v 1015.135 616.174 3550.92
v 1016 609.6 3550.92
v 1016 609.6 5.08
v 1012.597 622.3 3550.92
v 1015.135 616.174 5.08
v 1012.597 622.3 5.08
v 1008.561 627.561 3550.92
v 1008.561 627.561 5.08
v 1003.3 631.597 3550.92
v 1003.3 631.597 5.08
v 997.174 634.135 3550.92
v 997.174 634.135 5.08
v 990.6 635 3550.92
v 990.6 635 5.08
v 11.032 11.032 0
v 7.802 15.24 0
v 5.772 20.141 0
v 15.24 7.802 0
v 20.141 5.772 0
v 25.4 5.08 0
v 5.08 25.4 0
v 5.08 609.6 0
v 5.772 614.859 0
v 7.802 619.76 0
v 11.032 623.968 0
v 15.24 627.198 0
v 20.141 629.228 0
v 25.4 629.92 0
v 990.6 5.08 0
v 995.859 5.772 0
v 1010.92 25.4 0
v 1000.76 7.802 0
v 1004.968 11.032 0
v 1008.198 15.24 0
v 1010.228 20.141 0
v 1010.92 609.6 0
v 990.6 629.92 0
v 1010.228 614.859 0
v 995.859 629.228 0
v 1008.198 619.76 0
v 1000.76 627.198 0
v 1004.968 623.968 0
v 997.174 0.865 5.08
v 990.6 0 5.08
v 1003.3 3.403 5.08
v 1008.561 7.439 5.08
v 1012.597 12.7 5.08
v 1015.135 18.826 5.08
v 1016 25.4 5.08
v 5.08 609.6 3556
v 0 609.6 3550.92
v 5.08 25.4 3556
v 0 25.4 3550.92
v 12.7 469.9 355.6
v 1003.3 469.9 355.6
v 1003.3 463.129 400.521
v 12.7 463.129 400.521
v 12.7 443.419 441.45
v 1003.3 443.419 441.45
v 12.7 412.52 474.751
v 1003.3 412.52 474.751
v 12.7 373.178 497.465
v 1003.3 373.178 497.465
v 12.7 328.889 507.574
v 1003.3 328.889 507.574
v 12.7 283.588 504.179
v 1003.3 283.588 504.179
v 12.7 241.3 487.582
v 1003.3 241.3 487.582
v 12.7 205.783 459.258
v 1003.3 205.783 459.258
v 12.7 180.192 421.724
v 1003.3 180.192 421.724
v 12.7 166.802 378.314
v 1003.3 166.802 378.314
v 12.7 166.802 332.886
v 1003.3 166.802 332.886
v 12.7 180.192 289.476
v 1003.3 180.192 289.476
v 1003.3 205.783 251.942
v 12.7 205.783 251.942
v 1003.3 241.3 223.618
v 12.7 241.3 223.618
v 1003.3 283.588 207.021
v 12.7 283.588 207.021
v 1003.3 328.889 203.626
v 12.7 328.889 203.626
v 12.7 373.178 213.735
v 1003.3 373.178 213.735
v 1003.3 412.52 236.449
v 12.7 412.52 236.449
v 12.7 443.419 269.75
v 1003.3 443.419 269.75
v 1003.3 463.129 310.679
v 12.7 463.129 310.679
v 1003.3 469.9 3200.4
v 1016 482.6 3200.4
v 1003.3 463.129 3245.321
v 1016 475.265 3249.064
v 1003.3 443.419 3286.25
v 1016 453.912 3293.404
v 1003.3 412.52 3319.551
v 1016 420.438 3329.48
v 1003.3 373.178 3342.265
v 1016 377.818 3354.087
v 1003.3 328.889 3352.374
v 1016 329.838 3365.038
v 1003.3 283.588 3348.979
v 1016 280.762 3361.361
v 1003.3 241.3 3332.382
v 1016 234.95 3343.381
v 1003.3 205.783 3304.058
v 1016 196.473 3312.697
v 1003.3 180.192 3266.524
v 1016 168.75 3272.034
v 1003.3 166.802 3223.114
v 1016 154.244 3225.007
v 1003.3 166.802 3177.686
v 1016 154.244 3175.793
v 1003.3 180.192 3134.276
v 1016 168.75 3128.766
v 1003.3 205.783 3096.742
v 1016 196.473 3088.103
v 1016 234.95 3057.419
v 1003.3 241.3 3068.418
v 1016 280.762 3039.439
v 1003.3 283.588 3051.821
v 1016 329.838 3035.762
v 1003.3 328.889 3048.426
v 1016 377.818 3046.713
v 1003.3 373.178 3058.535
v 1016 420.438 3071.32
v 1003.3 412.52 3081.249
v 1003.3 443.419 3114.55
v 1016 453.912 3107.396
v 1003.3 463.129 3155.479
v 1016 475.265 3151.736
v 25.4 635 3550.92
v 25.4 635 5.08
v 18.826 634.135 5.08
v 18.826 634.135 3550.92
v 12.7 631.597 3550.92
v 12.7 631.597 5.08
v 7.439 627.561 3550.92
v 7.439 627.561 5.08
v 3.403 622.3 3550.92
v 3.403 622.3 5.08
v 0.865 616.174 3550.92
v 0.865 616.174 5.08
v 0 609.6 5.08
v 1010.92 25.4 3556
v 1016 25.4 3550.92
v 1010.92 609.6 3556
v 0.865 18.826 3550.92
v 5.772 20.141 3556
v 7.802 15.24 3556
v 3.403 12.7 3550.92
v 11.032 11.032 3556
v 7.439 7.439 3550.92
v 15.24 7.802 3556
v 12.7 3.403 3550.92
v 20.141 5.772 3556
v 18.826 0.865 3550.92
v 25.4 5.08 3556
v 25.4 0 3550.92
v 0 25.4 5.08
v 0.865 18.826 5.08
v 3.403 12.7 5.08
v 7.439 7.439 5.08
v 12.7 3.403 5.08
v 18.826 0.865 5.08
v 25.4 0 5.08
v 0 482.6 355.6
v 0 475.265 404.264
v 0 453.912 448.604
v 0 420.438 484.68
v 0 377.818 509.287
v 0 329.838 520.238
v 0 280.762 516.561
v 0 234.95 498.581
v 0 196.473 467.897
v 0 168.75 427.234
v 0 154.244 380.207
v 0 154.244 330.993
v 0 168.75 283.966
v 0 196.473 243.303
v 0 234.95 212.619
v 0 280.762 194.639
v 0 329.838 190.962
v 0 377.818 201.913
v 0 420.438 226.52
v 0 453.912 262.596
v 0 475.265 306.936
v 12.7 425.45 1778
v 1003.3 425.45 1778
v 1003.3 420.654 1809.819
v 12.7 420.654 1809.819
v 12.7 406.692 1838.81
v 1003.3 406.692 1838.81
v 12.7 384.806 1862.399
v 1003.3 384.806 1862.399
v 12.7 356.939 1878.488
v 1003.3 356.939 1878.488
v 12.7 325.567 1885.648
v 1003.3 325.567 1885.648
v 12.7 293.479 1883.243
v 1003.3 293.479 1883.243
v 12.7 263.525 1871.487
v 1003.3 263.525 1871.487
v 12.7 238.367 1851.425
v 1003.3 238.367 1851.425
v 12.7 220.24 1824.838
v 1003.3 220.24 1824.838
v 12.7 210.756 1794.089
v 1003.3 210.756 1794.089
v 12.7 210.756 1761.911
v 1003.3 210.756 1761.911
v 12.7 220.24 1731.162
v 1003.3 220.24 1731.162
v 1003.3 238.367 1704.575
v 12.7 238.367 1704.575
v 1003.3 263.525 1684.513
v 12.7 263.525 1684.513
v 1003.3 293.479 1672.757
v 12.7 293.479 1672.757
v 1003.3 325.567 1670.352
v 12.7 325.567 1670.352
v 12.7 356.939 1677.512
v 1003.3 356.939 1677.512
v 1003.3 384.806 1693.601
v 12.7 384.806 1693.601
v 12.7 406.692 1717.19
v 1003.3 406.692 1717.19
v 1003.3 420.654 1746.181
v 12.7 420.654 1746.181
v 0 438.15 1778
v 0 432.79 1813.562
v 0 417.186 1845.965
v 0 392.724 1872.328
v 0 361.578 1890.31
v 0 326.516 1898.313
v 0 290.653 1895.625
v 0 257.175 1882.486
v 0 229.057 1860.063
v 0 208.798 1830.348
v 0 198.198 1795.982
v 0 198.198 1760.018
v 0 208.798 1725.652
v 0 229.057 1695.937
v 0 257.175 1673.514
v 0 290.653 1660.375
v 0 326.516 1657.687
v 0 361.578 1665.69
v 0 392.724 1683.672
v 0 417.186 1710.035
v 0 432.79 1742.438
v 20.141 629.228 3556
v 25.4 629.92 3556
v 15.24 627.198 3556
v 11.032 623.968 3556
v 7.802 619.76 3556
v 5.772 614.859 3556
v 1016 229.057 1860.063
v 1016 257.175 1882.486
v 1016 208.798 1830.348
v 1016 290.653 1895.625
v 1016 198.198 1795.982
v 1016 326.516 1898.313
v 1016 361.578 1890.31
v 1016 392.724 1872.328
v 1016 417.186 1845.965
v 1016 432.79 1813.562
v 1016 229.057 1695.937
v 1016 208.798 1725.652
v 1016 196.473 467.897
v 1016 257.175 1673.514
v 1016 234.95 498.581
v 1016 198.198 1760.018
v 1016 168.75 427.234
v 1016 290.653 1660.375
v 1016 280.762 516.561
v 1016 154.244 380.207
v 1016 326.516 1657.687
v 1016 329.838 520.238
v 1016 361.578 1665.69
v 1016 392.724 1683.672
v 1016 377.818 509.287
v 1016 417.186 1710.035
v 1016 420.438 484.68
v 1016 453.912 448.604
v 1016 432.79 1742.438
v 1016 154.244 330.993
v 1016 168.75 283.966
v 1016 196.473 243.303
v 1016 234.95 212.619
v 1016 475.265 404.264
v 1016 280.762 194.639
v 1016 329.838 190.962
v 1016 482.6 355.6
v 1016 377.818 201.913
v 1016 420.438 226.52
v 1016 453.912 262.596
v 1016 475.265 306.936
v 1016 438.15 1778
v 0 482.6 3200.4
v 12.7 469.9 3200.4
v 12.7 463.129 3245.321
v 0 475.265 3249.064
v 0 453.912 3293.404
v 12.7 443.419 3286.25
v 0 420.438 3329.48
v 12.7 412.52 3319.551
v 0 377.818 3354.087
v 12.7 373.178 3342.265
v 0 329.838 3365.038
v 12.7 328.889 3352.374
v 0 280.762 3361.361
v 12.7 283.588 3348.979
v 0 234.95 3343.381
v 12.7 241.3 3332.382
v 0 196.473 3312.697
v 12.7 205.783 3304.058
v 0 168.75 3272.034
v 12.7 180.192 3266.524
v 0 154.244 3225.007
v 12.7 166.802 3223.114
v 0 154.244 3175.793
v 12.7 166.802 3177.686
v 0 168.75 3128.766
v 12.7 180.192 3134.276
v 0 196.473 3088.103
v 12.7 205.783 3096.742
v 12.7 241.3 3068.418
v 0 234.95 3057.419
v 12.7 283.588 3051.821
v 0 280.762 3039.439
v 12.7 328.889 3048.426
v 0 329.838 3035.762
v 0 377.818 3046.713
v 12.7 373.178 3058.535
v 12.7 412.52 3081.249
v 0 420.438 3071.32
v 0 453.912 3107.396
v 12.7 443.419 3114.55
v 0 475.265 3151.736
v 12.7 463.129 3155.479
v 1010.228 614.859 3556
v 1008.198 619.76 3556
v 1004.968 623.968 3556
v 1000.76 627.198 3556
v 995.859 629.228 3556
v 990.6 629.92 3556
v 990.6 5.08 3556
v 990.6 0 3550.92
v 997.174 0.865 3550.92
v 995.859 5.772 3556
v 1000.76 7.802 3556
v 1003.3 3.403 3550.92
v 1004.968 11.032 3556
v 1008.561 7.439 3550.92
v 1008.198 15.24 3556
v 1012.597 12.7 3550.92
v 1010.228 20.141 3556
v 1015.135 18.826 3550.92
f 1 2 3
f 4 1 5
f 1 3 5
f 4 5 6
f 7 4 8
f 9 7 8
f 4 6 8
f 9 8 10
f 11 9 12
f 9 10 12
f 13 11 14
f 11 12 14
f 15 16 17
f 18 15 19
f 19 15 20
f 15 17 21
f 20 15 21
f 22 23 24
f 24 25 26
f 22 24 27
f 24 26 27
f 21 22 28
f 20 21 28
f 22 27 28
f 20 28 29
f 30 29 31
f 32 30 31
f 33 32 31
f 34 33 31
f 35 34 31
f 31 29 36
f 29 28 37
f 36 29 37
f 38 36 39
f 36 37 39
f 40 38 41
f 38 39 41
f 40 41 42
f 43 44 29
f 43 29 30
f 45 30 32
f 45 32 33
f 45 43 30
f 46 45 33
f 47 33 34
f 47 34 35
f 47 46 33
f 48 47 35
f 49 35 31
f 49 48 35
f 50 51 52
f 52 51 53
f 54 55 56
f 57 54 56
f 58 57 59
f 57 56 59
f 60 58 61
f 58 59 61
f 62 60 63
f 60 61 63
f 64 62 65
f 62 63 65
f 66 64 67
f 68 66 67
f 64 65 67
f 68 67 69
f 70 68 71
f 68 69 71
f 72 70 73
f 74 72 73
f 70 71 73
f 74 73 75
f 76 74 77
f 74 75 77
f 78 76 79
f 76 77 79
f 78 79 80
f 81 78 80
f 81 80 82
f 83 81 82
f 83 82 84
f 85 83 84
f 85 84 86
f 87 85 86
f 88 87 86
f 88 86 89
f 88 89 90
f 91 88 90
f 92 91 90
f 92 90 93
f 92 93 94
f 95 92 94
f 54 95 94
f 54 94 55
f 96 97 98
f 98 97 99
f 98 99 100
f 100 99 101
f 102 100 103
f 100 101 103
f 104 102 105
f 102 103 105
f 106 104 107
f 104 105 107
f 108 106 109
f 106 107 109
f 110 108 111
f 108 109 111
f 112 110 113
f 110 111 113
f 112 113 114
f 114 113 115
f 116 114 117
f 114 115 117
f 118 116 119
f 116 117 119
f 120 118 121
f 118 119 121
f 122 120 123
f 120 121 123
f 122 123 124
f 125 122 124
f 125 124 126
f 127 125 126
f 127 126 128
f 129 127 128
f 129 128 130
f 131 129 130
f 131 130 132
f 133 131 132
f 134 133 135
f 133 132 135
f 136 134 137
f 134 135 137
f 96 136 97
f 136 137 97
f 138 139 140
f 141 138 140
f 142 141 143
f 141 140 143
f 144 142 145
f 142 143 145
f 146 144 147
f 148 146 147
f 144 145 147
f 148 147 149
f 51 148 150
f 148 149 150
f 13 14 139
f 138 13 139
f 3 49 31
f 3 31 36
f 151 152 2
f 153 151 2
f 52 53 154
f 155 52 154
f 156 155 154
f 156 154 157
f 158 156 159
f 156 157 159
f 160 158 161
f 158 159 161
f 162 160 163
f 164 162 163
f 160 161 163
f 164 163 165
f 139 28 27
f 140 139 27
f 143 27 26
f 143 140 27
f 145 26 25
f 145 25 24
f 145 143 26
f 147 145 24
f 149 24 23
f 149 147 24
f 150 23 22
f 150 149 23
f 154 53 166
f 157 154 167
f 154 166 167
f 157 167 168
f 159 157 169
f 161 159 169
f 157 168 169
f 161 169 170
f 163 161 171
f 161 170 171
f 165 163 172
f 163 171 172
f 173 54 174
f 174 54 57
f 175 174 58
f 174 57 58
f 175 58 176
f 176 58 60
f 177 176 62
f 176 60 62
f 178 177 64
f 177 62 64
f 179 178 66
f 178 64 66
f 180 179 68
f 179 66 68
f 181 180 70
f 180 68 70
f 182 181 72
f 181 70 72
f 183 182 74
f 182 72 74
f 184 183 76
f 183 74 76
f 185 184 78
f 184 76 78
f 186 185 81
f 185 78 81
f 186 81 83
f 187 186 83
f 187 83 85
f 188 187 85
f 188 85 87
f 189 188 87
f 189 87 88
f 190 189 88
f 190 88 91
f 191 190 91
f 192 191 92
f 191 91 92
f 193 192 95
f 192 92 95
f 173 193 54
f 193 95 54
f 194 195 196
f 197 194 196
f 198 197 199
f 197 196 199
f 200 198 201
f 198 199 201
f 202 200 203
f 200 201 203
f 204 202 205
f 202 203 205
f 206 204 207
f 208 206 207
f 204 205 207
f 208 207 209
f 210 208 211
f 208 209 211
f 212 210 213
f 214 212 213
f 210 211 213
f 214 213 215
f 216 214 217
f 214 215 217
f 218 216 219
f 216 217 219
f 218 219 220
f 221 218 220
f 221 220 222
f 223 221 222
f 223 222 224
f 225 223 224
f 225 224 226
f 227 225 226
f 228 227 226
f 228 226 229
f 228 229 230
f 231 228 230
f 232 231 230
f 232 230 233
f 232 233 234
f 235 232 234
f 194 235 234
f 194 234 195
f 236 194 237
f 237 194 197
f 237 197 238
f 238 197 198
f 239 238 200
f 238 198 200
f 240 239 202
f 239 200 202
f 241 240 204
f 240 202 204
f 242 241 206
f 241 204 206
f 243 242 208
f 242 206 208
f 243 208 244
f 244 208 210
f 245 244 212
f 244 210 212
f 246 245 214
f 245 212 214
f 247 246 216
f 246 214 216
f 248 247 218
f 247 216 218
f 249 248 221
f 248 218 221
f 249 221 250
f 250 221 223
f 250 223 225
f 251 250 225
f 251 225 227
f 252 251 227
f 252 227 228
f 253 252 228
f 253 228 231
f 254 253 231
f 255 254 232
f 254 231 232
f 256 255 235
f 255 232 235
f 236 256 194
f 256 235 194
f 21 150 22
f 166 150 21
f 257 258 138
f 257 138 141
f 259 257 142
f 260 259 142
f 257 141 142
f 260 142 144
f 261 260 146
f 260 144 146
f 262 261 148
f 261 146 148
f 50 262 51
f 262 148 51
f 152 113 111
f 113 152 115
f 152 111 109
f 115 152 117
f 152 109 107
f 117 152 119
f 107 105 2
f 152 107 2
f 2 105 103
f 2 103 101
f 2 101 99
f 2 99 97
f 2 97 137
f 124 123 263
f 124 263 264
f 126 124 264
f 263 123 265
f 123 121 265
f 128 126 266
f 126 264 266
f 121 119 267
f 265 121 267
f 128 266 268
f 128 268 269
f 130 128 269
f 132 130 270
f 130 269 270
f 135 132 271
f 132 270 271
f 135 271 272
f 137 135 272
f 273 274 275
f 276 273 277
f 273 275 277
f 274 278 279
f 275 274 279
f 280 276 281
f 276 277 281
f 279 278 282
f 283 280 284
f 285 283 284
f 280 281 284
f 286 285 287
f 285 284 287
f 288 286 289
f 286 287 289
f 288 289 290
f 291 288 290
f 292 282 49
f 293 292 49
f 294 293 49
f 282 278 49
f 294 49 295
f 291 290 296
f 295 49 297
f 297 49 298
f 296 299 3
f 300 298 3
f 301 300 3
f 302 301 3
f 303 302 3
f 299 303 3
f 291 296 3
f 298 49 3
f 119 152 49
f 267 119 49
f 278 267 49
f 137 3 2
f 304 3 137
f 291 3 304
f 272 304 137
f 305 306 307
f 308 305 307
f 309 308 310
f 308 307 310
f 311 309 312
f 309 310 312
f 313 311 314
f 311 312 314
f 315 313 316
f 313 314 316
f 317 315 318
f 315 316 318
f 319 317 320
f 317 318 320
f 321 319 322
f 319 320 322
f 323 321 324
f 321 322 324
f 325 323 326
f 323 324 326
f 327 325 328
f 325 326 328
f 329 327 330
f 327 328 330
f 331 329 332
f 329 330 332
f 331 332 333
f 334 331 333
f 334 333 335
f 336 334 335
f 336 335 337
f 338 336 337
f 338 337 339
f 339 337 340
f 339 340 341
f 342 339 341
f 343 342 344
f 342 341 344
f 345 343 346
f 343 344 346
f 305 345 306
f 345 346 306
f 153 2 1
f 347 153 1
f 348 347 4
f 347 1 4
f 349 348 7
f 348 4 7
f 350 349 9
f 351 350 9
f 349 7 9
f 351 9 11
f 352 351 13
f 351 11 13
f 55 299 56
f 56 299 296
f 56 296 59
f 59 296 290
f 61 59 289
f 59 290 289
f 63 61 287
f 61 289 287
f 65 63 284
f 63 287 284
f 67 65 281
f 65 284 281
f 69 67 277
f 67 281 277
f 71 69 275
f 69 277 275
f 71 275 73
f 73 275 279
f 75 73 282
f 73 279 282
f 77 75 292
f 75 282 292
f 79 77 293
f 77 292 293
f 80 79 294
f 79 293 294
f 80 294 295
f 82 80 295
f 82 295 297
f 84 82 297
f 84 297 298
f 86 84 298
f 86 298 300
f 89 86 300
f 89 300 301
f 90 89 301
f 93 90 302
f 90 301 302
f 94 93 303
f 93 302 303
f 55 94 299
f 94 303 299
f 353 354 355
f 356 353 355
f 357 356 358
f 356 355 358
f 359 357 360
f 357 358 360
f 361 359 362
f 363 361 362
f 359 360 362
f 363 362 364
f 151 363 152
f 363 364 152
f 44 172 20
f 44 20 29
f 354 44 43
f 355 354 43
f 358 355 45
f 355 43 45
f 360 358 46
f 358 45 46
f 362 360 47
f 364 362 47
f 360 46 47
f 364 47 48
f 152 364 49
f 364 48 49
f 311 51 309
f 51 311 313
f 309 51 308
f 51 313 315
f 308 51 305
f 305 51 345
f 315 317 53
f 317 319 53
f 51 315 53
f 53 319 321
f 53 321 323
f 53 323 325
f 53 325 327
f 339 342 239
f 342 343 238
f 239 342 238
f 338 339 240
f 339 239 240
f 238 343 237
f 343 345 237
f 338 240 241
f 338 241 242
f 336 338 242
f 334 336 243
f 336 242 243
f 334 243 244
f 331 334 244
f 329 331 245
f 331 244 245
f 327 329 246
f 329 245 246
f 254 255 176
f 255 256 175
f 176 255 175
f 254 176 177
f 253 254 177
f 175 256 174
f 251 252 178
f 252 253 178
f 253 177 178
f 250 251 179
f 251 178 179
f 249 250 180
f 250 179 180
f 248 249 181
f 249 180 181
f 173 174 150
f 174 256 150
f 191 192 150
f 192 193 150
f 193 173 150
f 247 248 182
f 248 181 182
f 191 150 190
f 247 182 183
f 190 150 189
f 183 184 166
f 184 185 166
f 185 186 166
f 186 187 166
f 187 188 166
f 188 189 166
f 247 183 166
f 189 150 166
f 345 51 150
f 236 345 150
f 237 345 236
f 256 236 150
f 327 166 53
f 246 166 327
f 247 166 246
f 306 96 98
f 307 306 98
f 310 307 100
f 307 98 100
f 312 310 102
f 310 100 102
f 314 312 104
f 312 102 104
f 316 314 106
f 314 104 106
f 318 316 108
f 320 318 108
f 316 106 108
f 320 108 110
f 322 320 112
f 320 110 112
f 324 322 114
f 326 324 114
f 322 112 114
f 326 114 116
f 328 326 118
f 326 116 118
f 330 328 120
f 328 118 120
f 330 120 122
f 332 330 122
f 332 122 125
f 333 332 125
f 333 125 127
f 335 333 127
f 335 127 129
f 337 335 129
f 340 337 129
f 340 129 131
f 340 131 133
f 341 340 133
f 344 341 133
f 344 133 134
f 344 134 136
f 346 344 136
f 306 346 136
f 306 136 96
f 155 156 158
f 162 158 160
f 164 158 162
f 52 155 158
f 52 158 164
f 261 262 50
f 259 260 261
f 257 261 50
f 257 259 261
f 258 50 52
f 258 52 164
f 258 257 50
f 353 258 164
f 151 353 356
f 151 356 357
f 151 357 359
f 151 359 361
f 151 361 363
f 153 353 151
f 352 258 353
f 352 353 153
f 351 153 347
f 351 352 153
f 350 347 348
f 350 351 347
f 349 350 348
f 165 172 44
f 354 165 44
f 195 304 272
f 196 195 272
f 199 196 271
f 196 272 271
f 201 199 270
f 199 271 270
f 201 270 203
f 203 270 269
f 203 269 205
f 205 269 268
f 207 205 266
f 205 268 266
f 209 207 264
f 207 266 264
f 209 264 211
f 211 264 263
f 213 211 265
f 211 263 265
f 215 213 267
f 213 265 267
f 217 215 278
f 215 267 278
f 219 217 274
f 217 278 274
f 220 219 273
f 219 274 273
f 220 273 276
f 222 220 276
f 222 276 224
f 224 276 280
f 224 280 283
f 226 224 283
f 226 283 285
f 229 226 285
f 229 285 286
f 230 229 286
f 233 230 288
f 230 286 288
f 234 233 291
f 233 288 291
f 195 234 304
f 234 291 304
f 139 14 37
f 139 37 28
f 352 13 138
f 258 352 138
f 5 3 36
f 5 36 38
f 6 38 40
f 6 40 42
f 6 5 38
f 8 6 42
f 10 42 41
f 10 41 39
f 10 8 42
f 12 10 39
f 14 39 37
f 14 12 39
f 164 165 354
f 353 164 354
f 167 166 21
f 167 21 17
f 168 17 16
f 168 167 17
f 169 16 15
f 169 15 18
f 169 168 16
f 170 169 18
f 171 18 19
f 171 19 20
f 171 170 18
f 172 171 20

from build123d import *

# Parameters (mm, degrees)
F1_DEPTH = 3556
F2_R     = 107.95
F2_R_2   = 152.4
F3_DEPTH = 1016.001
F4_SIZE  = 12.7
F5_SIZE  = 5.08
F6_SIZE  = 5.08


with BuildPart() as f1:
    # F0 (on Top) → F1 (new body)
    with BuildSketch(Plane.XY):
        with BuildLine():
            ThreePointArc((0, 25.4), (7.439488, 7.439488), (25.4, 0))
            Line((25.4, 0), (990.6, 0))
            ThreePointArc((990.6, 0), (1008.560512, 7.439488), (1016, 25.4))
            Line((1016, 25.4), (1016, 609.6))
            ThreePointArc((1016, 609.6), (1008.560512, 627.560512), (990.6, 635))
            Line((990.6, 635), (25.4, 635))
            ThreePointArc((25.4, 635), (7.439488, 627.560512), (0, 609.6))
            Line((0, 609.6), (0, 25.4))
        make_face()
    extrude(amount=F1_DEPTH)

    # F2 (on face) → F3 (cut, through all)
    with BuildSketch(Plane.YZ.offset(1016)):
        with Locations((317.5, 1778)):
            Circle(F2_R)
        with Locations((317.5, 3200.4)):
            Circle(F2_R_2)
        with Locations((317.5, 355.6)):
            Circle(F2_R_2)
    extrude(amount=-F3_DEPTH, mode=Mode.SUBTRACT)

    # F4
    f4_edges = [f1.edges().sort_by_distance(p)[0] for p in [
        (1016, 165.1, 3200.4),
        (1016, 209.55, 1778),
        (1016, 165.1, 355.6),
        (0, 165.1, 3200.4),
        (0, 209.55, 1778),
        (0, 165.1, 355.6),
    ]]
    chamfer(f4_edges, length=F4_SIZE)

    # F5
    f5_edges = [f1.edges().sort_by_distance(p)[0] for p in [
        (508, 0, 3556),
        (0, 317.5, 3556),
        (508, 635, 3556),
        (1016, 317.5, 3556),
    ]]
    chamfer(f5_edges, length=F5_SIZE)

    # F6
    f6_edges = [f1.edges().sort_by_distance(p)[0] for p in [
        (508, 635, 0),
        (1016, 317.5, 0),
        (508, 0, 0),
        (0, 317.5, 0),
    ]]
    chamfer(f6_edges, length=F6_SIZE)


solid = f1.part
